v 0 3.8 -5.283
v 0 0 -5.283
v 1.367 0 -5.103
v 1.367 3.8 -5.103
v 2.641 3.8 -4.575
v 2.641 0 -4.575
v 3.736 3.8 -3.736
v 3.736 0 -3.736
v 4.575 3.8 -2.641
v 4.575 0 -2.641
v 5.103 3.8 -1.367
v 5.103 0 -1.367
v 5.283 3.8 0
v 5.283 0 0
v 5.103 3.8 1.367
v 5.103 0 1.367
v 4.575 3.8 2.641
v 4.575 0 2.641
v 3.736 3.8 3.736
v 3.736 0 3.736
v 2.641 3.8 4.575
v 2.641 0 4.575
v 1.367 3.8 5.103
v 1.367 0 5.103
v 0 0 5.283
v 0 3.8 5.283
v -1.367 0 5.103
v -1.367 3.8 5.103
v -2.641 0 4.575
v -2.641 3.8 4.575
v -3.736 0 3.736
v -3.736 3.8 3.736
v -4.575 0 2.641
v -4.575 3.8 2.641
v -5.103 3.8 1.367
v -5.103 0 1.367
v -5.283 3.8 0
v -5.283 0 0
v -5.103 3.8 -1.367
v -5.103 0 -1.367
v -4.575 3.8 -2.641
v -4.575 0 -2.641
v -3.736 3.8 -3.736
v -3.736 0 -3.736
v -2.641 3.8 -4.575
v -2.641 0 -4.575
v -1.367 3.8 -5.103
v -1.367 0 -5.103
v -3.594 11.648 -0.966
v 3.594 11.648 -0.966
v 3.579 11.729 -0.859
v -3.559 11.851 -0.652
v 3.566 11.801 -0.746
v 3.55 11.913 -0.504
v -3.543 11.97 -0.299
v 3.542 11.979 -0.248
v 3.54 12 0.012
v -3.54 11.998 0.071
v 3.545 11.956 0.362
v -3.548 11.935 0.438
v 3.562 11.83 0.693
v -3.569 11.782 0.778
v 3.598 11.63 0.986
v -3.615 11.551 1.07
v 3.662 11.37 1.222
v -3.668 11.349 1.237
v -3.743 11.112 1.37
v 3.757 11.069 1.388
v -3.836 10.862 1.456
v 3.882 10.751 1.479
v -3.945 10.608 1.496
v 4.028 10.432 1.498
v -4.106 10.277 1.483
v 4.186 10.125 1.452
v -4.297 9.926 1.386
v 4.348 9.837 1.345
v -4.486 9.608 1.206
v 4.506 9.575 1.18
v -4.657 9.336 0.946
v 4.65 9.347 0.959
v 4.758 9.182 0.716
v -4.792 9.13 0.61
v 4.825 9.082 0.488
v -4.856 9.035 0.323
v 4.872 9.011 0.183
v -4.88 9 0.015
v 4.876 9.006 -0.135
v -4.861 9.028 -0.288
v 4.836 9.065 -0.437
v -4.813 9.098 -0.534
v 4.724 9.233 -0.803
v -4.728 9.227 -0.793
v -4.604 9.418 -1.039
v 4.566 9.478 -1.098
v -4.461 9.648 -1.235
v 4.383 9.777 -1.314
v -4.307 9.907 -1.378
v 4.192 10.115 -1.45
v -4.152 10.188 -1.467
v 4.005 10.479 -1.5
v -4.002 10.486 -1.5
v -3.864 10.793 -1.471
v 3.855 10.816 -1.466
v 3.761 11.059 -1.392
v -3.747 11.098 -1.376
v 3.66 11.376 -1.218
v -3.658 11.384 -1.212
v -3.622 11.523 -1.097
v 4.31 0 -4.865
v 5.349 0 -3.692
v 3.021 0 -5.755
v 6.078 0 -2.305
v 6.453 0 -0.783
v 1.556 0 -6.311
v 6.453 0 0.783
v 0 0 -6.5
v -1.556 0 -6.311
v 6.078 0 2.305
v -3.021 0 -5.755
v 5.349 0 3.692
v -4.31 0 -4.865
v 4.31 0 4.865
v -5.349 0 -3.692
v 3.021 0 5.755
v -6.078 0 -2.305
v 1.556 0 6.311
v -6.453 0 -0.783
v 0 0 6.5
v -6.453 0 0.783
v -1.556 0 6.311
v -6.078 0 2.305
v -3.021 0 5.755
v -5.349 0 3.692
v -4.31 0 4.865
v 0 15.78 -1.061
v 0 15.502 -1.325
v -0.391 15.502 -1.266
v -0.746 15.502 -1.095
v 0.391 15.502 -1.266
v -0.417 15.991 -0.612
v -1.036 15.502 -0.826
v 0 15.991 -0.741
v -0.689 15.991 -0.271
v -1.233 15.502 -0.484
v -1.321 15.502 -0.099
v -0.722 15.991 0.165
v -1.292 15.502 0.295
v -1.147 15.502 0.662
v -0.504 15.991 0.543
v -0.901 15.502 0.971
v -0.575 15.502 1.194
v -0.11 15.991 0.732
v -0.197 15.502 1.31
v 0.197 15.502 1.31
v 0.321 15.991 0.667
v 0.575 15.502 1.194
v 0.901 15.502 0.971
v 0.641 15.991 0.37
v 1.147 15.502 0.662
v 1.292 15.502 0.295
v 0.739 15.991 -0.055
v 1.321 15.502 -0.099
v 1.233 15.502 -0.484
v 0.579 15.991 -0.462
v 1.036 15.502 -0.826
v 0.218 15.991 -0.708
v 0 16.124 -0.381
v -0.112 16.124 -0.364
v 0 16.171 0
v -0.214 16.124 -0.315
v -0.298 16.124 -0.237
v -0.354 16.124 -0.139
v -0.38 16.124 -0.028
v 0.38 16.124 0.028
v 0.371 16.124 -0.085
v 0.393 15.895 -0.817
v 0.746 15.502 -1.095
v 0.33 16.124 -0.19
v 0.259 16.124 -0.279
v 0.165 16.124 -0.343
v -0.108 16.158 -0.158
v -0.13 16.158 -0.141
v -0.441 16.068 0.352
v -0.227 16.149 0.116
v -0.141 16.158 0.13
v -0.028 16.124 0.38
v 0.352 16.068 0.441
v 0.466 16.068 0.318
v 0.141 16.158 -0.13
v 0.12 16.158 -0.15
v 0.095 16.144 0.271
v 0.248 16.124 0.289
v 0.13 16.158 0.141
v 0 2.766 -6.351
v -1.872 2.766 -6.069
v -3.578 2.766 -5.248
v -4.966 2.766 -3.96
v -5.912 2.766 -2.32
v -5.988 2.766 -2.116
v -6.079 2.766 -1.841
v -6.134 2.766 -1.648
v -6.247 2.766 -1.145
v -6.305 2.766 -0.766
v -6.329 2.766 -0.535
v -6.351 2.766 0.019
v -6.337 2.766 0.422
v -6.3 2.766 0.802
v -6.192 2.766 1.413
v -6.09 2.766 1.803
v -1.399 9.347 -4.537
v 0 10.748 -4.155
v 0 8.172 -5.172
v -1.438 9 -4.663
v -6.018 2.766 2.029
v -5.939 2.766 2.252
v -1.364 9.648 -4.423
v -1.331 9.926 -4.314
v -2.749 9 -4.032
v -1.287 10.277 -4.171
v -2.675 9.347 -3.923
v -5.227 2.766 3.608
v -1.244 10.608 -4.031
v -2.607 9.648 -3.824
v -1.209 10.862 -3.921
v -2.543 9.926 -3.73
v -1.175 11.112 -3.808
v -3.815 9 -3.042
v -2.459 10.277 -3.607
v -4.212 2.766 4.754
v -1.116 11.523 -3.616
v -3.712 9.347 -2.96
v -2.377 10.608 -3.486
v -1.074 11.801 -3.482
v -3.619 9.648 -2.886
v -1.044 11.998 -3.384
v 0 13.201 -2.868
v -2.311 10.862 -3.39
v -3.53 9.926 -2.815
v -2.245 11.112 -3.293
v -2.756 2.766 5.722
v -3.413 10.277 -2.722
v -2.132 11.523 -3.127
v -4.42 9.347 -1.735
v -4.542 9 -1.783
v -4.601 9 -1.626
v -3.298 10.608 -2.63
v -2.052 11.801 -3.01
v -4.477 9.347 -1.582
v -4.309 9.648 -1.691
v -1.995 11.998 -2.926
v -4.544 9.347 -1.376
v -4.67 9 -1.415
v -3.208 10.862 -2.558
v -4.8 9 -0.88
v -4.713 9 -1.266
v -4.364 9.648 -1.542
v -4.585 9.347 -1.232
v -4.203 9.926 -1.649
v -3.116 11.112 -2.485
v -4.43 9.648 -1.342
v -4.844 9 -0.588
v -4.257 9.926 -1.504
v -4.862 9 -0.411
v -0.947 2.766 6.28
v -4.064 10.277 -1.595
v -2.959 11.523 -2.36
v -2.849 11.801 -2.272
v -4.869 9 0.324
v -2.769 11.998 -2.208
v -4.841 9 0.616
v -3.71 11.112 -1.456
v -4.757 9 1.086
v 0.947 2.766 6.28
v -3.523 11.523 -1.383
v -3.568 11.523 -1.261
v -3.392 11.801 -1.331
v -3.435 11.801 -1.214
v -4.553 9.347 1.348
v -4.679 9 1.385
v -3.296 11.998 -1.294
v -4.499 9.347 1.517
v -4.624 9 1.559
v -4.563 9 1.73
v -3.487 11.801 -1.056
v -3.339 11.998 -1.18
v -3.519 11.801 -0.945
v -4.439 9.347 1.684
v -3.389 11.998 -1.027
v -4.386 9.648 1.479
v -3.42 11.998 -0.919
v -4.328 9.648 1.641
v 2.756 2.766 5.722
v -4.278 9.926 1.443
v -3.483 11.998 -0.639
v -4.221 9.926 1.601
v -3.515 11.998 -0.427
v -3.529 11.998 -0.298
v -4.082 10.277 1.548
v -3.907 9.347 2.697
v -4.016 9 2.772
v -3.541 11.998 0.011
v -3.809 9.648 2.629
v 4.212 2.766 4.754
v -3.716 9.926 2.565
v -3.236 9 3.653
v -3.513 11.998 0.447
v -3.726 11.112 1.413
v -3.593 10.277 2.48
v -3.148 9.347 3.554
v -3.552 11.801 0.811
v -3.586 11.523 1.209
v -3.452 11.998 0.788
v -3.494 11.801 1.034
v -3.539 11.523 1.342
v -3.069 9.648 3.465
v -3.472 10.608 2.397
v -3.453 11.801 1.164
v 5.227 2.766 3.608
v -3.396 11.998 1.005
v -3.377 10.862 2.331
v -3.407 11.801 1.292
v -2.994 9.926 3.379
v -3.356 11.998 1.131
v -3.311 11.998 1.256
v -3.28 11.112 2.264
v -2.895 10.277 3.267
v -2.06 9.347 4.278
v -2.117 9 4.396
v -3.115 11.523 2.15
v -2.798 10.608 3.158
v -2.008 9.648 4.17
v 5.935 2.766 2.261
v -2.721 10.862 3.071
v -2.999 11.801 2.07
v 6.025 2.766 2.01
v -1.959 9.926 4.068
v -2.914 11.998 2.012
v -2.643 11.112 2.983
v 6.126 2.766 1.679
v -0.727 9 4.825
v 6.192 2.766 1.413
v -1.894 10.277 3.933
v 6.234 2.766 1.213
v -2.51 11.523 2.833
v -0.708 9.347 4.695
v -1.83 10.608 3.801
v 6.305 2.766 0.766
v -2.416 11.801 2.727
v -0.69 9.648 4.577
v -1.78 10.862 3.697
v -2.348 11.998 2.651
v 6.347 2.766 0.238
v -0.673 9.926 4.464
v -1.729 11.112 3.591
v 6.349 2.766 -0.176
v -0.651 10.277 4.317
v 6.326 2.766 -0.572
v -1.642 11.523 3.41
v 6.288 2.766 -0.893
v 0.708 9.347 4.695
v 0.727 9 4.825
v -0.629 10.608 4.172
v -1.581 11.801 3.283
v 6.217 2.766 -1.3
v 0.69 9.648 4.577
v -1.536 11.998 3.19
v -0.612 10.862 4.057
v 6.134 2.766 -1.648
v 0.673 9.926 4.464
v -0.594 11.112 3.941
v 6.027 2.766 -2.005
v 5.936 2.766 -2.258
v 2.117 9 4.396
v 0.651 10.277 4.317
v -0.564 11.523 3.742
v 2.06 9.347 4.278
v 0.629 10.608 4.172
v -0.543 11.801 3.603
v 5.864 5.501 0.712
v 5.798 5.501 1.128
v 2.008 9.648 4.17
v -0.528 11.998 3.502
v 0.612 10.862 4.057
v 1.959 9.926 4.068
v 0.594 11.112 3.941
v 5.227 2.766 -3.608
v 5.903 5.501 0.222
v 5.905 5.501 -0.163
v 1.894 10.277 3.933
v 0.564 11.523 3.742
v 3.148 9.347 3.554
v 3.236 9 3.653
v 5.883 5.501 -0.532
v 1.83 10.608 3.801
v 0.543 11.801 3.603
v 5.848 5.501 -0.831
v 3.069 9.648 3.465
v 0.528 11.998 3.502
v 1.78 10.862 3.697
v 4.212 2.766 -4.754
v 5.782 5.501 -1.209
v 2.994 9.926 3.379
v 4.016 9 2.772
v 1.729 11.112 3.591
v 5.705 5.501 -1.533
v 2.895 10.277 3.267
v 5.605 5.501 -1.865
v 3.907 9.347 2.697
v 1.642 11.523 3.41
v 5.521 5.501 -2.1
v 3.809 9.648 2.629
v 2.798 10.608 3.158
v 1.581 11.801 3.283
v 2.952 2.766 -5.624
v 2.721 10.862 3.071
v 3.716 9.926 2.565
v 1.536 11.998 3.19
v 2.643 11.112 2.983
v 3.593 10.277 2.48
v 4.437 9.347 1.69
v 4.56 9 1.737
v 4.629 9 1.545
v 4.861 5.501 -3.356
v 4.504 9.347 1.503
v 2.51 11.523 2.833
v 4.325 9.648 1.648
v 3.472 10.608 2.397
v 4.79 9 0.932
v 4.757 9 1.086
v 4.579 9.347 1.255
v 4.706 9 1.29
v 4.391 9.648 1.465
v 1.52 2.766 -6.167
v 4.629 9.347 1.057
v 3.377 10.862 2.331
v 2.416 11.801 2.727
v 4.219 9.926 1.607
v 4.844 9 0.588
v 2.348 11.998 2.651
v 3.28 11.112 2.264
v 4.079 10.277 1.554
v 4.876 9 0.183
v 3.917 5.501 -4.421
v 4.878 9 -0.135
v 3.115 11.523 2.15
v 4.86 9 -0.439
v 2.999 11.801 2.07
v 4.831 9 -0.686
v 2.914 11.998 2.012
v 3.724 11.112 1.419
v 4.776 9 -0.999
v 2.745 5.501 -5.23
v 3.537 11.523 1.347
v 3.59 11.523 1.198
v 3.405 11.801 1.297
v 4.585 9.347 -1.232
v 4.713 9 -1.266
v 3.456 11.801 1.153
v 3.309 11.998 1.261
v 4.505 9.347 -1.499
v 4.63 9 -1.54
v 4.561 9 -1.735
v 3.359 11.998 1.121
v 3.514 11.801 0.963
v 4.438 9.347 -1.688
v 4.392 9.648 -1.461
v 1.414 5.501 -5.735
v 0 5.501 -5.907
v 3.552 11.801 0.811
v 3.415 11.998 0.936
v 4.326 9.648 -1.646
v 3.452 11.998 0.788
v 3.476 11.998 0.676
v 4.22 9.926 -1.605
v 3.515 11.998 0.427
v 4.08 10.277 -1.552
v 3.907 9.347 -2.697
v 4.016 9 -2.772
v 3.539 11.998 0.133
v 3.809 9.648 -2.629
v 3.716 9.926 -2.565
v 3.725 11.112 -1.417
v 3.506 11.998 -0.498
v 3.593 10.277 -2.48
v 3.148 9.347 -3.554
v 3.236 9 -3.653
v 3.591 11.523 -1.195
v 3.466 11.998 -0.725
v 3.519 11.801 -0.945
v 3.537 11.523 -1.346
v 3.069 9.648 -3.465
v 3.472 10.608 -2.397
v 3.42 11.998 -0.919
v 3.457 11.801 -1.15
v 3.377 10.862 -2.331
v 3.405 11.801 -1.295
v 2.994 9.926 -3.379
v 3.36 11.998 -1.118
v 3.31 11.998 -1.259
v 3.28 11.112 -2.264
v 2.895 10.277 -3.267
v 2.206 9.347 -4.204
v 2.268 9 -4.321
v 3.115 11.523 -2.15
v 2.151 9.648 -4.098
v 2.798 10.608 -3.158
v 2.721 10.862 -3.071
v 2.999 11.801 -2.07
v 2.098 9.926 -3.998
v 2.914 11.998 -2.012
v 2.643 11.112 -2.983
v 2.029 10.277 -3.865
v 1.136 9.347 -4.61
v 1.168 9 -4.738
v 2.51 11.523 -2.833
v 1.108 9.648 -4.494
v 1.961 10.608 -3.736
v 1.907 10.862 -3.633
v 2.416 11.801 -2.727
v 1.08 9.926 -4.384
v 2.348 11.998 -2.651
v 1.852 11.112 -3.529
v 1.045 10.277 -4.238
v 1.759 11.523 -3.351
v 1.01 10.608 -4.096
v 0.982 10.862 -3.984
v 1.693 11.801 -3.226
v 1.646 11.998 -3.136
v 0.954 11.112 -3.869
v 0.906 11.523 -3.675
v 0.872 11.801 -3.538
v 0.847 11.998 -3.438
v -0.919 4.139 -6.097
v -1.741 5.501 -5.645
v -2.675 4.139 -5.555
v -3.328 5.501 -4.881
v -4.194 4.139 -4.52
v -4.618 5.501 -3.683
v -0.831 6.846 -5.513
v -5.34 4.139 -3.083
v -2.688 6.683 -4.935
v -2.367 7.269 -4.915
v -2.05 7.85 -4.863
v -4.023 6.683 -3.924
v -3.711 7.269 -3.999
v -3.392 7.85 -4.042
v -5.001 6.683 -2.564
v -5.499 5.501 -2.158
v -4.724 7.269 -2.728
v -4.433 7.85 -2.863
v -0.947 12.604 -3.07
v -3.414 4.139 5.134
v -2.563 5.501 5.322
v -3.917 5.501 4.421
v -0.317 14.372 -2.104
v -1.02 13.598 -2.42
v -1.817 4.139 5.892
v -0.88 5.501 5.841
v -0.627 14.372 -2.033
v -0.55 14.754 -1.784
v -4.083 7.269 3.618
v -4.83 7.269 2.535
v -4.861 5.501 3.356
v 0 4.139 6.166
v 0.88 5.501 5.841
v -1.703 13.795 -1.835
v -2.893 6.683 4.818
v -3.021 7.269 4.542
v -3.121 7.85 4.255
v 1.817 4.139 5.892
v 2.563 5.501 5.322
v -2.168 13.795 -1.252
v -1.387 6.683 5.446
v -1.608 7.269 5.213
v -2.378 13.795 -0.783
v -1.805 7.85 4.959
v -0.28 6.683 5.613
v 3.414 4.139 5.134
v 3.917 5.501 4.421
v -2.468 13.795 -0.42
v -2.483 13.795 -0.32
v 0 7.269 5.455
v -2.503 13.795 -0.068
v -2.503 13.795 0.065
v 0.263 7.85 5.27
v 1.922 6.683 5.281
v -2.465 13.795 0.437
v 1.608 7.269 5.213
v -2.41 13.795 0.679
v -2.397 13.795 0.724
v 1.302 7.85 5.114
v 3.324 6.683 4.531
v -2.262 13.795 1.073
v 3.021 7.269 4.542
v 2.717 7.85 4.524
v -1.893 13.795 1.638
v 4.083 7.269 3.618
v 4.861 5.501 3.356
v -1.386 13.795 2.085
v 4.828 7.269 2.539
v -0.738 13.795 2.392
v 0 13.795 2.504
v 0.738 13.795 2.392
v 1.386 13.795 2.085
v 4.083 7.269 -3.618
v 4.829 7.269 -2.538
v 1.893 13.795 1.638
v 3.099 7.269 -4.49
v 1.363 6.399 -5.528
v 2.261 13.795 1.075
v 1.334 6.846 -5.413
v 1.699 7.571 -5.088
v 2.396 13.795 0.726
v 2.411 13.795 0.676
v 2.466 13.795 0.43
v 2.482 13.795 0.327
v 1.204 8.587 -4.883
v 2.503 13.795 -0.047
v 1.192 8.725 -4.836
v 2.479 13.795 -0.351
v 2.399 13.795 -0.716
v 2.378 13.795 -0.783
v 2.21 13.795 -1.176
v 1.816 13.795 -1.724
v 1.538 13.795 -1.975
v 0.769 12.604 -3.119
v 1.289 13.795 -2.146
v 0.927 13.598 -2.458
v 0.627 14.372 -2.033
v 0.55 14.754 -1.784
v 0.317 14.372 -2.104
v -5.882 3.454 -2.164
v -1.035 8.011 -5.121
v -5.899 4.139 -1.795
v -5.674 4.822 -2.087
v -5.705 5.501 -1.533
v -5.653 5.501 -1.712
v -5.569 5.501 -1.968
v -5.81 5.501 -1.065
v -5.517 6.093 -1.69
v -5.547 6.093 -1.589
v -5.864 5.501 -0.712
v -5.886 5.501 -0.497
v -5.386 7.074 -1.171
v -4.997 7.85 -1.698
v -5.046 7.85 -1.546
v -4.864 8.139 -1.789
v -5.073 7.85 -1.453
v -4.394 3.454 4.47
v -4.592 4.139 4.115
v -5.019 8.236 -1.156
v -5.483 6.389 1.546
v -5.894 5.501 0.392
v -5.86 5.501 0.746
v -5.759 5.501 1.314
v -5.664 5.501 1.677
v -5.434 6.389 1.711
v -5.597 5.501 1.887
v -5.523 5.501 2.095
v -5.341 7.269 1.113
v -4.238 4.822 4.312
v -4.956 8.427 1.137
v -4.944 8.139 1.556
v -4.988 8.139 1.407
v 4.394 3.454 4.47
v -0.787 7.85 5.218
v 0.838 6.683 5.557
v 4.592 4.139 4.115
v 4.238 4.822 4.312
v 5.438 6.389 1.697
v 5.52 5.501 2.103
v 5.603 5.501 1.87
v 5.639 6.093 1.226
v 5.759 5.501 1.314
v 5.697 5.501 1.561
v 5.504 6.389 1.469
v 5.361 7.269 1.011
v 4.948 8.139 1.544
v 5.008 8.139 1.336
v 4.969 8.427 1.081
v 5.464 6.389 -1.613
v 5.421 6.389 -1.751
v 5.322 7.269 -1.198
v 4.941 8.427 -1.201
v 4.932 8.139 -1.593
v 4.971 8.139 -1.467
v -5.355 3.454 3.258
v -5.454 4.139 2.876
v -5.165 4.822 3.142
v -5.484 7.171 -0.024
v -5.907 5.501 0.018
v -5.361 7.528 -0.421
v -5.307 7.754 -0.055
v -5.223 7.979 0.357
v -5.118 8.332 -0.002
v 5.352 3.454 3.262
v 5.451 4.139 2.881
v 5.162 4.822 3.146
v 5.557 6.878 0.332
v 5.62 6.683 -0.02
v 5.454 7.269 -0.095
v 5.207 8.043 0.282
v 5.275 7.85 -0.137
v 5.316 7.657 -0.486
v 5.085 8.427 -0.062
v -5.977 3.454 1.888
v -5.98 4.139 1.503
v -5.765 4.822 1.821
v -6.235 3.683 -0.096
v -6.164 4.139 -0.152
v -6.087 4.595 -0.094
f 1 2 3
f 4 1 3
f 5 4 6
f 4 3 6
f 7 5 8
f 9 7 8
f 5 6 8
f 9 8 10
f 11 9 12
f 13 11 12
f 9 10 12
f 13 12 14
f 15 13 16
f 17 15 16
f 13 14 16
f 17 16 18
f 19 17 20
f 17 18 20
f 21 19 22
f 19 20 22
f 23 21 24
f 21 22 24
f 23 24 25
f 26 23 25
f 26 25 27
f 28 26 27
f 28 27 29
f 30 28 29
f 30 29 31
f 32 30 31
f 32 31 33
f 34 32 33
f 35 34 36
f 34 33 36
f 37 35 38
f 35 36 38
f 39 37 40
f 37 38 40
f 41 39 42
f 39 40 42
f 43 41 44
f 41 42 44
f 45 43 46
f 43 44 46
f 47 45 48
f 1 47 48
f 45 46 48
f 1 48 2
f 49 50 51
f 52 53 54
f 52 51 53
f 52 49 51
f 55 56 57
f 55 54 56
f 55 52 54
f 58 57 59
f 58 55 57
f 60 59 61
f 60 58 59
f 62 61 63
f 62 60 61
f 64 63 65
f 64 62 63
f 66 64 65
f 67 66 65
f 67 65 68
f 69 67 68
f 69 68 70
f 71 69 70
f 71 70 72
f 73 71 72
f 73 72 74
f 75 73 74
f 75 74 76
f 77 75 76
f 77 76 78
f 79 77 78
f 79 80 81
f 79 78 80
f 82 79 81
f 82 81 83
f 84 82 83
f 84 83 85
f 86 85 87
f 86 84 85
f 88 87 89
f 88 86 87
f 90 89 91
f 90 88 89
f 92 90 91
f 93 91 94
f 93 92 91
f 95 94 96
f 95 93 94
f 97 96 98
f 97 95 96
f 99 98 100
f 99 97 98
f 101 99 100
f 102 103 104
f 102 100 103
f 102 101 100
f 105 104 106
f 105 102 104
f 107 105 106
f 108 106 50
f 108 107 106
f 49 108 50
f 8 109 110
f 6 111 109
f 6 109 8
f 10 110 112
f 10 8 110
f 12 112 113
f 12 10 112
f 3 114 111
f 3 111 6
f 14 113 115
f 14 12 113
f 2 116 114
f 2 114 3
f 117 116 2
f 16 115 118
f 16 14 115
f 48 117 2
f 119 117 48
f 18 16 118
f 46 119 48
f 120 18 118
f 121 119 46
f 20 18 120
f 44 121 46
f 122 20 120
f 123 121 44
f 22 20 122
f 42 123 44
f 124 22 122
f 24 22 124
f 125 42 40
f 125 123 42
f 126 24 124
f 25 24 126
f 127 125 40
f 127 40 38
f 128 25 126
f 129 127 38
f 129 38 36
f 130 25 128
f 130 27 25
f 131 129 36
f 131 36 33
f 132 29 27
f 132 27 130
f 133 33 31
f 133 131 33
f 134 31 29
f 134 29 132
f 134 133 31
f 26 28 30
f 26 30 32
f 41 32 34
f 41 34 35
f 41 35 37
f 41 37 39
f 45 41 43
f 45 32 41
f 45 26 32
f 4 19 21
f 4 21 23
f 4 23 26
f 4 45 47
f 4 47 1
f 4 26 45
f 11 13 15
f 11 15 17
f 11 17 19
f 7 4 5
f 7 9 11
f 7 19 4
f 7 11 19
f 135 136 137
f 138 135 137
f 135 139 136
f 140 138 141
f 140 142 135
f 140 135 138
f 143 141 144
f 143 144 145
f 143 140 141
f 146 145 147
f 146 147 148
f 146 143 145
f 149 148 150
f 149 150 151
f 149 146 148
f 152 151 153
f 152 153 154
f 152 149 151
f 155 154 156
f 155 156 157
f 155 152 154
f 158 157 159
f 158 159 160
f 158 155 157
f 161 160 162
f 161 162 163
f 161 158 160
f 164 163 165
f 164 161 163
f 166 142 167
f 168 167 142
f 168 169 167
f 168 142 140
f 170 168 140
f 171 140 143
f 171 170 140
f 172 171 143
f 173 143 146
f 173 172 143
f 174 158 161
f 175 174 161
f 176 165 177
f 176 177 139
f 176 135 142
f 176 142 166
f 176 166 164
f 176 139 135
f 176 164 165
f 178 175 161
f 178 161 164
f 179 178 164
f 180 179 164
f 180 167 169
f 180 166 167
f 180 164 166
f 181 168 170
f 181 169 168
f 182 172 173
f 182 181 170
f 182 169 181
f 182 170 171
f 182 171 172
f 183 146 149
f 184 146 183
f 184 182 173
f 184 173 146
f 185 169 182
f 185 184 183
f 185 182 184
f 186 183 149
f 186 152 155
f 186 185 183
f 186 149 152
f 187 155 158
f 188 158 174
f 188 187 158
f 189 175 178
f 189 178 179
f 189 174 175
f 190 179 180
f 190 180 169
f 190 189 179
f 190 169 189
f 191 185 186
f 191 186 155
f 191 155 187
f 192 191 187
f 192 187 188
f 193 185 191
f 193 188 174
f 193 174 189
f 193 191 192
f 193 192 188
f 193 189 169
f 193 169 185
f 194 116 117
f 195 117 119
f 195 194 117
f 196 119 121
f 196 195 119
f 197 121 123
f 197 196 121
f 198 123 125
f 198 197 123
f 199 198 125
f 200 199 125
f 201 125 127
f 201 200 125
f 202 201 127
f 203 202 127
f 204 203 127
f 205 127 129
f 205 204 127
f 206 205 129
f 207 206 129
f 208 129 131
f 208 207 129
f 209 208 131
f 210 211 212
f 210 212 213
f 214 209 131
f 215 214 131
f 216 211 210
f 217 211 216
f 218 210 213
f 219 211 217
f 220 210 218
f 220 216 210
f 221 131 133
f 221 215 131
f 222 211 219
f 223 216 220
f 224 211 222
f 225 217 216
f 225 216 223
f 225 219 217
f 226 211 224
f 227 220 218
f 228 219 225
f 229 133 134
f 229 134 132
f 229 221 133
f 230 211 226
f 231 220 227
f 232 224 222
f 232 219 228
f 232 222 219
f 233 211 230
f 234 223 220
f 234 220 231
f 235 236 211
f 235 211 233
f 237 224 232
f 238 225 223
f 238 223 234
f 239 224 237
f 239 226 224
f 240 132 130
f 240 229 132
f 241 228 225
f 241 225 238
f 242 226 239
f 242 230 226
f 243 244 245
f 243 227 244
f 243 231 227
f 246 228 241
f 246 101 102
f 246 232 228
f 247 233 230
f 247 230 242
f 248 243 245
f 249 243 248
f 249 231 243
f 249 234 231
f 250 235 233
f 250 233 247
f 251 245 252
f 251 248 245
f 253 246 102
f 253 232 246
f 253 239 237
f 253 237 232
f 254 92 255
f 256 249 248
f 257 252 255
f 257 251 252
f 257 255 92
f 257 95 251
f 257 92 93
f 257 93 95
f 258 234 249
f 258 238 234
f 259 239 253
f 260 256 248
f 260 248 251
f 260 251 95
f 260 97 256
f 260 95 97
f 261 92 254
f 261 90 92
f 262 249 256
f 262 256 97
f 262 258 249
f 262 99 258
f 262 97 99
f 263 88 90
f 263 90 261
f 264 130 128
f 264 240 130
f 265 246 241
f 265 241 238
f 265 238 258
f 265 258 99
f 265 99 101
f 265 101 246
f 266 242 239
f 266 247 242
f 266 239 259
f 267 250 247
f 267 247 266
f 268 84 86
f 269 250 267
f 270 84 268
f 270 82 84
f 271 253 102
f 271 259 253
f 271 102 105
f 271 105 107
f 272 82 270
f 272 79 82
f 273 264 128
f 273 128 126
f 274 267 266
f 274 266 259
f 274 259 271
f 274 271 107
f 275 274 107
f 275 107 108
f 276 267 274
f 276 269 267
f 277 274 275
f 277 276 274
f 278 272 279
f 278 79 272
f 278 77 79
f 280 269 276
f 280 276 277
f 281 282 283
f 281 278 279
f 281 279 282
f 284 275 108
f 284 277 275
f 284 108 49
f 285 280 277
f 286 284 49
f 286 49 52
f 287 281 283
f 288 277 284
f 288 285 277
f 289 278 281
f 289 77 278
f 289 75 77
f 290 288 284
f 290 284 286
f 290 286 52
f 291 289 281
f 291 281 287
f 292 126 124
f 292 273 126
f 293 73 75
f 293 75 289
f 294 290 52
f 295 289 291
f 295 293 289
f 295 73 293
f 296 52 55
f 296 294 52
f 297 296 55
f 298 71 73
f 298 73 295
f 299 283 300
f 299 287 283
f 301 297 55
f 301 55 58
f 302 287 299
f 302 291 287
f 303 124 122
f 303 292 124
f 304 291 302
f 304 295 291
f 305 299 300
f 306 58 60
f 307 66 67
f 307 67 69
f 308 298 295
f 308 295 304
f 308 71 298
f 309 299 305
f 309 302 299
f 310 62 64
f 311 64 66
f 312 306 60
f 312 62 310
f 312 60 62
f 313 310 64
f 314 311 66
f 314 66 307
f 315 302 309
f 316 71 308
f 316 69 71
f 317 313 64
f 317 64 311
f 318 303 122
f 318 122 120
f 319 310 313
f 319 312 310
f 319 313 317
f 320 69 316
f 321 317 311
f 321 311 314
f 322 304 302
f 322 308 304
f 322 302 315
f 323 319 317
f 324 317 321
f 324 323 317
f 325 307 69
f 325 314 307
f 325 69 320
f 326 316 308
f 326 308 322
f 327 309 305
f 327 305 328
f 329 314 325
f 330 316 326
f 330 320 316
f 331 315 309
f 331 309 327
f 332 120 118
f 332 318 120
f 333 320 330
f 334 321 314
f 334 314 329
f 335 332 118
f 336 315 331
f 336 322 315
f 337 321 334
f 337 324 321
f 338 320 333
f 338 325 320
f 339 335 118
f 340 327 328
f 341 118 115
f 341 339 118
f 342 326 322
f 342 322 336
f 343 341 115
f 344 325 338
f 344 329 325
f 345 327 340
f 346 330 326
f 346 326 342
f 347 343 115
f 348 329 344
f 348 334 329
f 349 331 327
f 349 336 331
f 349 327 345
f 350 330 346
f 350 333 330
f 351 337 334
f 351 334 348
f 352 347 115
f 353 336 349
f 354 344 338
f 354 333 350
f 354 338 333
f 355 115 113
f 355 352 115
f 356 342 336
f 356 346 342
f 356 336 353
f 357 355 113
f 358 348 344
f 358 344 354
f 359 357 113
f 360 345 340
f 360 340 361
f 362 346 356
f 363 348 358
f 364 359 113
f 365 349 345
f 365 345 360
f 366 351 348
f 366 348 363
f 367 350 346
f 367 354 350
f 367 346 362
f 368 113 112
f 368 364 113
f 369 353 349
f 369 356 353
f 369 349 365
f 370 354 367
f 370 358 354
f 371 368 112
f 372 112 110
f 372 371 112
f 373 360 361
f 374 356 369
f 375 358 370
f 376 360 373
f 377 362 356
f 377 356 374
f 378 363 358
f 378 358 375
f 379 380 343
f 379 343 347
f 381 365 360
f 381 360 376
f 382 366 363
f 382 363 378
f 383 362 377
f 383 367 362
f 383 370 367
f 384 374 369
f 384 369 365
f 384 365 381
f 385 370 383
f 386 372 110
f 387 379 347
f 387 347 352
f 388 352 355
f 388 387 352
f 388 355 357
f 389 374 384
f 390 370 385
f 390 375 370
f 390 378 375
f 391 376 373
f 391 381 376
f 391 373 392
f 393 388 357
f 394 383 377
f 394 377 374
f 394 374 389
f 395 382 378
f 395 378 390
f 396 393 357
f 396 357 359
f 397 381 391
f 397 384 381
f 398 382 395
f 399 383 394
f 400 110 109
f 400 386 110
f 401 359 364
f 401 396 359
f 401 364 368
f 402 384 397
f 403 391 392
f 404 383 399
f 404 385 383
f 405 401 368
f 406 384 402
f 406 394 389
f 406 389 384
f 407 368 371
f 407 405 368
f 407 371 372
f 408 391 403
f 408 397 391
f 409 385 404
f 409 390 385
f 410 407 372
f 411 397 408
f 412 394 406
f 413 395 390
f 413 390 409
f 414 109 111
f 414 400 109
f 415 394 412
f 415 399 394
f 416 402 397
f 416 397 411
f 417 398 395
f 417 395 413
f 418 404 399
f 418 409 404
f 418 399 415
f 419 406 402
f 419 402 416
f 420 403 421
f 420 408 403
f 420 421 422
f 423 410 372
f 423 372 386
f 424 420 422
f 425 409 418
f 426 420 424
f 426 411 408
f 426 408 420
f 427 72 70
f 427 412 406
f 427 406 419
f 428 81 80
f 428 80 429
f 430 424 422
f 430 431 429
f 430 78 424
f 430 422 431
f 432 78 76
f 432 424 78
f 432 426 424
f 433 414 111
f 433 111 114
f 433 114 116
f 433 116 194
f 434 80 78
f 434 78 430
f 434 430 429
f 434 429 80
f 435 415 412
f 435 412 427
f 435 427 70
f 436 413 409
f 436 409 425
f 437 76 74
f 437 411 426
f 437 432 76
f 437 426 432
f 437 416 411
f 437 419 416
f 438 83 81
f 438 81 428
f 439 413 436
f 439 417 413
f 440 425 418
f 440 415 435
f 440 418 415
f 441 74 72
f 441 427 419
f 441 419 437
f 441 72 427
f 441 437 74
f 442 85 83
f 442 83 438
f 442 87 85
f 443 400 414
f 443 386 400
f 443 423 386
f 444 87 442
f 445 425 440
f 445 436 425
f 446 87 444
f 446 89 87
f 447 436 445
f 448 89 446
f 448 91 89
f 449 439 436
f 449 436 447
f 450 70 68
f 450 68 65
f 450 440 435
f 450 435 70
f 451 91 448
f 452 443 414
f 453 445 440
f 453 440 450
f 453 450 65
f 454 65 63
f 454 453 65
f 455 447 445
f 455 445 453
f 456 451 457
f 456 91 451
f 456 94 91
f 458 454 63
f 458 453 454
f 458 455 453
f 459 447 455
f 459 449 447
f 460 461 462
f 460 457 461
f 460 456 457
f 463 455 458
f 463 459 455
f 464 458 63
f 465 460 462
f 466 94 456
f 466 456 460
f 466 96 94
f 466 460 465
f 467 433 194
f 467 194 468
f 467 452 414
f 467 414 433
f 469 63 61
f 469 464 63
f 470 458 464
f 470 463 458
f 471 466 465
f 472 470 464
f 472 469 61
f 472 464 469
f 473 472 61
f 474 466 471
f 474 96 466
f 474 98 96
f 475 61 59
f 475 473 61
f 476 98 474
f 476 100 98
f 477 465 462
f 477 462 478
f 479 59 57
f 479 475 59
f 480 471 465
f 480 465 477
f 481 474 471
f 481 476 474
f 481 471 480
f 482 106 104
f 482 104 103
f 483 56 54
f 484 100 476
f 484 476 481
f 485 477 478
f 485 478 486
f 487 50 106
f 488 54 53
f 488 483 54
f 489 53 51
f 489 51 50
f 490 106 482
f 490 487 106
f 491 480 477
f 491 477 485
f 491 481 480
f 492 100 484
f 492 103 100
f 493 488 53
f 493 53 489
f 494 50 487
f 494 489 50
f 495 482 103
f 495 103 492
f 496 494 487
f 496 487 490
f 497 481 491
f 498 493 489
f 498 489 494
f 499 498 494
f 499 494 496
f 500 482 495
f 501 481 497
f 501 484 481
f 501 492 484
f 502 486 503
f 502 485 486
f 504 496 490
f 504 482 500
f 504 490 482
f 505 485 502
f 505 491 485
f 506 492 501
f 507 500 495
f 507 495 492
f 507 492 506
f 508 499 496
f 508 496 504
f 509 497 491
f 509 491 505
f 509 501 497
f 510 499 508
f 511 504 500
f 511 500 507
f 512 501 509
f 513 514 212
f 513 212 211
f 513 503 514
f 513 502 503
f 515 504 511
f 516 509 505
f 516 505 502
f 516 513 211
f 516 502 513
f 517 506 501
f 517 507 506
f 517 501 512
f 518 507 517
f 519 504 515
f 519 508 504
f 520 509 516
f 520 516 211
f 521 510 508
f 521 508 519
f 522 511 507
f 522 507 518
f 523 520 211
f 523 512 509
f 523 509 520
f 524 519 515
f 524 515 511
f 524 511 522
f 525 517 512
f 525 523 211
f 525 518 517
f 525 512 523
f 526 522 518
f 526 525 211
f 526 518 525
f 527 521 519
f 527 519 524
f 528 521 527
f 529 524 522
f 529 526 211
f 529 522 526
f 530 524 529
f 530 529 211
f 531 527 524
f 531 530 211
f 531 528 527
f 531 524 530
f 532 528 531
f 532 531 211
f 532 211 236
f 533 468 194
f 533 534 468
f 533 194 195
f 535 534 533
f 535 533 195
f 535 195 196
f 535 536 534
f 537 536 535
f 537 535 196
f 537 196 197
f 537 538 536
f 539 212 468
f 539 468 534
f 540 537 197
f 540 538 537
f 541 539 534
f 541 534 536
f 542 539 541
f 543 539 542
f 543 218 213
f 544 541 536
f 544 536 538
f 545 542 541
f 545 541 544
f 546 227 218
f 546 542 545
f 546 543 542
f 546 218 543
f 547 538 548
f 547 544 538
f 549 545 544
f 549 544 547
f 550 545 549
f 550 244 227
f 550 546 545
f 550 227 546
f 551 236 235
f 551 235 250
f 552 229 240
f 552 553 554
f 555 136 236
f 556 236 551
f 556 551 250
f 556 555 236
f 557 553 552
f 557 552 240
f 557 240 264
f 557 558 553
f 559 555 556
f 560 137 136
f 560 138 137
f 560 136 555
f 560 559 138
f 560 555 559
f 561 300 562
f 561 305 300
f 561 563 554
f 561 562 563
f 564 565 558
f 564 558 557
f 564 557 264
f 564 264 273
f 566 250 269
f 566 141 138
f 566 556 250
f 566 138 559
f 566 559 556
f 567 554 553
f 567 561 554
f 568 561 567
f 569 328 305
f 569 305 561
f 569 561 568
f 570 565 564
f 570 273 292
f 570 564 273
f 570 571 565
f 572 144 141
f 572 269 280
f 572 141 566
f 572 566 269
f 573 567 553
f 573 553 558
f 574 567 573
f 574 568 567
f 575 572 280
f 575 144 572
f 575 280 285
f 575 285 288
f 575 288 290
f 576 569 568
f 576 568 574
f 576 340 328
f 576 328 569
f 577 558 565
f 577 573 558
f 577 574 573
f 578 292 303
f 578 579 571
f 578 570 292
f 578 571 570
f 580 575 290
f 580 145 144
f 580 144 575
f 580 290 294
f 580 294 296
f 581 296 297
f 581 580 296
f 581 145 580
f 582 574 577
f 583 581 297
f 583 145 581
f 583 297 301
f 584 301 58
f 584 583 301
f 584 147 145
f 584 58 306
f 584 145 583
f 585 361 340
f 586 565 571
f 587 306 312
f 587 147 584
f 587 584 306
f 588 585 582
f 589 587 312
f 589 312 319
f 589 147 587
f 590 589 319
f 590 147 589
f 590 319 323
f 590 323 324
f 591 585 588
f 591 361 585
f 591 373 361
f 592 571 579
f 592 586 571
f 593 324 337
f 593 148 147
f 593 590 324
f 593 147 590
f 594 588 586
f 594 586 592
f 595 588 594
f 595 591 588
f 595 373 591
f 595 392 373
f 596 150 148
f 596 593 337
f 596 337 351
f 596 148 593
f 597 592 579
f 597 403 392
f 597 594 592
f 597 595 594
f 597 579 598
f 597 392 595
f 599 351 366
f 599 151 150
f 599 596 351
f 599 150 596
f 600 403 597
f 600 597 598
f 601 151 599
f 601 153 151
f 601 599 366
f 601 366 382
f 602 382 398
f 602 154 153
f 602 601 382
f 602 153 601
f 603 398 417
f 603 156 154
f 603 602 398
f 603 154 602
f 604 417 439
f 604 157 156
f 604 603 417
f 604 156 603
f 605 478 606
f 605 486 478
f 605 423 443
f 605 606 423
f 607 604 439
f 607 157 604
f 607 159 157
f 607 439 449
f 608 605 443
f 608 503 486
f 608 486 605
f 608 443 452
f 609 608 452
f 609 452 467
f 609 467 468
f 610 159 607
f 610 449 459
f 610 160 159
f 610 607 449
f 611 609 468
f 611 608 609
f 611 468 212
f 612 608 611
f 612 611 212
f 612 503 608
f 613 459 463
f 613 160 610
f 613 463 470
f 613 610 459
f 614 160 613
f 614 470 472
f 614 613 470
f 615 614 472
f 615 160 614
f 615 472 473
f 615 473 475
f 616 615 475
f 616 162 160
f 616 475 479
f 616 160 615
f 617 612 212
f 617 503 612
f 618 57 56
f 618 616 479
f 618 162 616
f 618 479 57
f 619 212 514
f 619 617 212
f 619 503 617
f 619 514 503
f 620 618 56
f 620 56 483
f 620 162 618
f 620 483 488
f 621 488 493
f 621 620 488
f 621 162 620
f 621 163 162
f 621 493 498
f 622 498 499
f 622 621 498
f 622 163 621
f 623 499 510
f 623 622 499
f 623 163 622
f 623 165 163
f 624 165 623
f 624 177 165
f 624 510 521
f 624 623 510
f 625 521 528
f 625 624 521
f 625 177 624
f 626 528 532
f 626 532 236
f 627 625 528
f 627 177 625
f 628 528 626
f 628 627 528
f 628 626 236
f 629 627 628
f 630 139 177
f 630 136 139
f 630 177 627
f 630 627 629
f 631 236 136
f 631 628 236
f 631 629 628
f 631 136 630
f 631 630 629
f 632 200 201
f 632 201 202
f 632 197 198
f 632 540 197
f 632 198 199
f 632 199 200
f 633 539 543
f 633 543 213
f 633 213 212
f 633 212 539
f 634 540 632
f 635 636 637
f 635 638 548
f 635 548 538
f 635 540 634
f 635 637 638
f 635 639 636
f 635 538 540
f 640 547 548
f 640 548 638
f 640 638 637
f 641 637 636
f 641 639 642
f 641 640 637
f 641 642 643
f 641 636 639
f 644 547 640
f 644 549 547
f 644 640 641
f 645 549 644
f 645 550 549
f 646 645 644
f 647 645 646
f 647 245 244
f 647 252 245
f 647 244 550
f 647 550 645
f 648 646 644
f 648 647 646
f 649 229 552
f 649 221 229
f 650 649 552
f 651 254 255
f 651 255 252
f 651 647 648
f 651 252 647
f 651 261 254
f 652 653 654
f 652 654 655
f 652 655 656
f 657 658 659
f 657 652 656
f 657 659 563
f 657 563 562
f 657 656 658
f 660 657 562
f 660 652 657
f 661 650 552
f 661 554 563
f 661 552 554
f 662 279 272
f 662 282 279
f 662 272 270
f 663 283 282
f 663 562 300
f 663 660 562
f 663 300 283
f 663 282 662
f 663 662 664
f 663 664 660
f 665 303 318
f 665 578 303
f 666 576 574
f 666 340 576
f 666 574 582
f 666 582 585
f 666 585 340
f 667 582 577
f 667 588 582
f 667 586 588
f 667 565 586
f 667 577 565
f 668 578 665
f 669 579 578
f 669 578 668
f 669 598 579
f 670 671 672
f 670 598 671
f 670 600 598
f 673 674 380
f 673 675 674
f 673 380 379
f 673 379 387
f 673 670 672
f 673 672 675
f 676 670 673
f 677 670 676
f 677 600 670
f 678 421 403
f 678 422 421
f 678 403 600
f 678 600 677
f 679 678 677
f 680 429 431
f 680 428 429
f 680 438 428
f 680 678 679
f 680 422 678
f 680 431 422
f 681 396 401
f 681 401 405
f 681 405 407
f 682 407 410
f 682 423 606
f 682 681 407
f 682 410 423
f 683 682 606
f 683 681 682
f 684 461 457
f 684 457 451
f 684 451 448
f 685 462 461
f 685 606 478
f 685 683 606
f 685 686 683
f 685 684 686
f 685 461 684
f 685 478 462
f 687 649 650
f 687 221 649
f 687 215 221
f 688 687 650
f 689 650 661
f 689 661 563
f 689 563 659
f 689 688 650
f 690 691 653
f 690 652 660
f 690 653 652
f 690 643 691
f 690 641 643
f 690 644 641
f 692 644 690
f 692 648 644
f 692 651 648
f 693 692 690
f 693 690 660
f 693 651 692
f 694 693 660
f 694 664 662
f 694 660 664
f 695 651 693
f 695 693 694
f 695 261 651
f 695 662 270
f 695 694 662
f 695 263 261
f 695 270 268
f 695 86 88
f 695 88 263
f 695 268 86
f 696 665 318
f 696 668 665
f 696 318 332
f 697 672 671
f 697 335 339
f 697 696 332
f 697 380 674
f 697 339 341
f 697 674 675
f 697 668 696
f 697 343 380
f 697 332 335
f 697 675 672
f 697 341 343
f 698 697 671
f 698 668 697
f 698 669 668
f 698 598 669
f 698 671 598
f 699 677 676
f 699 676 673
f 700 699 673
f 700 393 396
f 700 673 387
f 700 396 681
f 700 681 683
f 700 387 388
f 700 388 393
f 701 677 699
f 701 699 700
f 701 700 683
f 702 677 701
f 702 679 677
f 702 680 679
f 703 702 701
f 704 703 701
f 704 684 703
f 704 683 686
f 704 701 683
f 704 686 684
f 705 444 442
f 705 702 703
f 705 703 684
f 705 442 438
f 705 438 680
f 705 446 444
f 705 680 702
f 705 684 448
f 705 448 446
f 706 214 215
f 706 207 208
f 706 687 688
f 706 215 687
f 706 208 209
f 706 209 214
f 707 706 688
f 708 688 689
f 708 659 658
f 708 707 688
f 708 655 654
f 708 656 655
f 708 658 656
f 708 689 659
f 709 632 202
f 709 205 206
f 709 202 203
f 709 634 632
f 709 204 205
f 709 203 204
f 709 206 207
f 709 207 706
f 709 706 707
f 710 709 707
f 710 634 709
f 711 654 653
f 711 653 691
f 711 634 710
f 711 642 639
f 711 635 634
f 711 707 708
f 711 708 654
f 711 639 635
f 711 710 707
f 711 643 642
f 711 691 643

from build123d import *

# Parameters (mm, degrees)
SKETCH2_R               = 5.282935157
CUT_EXTRUDE1_DEPTH      = 3.8
CUT_EXTRUDE2_DEPTH      = 19.600984372
CUT_EXTRUDE2_DEPTH_BACK = 19.600984372
SKETCH3_R               = 1.5


with BuildPart() as part:
    # Sketch1 → Revolve1 (revolve)
    with BuildSketch(Plane(origin=(0, 0, 0), x_dir=(0, 0, -1), z_dir=(1, 0, 0))):
        with BuildLine():
            Line((0, 0), (6.5, 0))
            ThreePointArc((6.5, 0), (5.172084989, 8.171560643), (1.324999798, 15.502160698))
            ThreePointArc((1.324999798, 15.502160698), (0.740614183, 15.991289723), (0, 16.170856928))
            Line((0, 16.170856928), (0, 0))
        make_face()
    revolve(axis=Axis((0, 0, 0), (0, 1, 0)))

    # Sketch2 → Cut-Extrude1 (cut)
    with BuildSketch(Plane.XZ):
        with Locations(Location((0, 0, 0), (0, 0, 270))):
            Circle(SKETCH2_R)
    extrude(amount=-CUT_EXTRUDE1_DEPTH, mode=Mode.SUBTRACT)

    # Sketch3 → Cut-Extrude2 (cut, two sides: drawn at the far end of the back side and taken through both)
    with BuildSketch(Plane(origin=(0, 0, 0), x_dir=(0, 0, -1), z_dir=(1, 0, 0)).offset(-CUT_EXTRUDE2_DEPTH_BACK)):
        with Locations(Location((0, 10.5, 0), (0, 0, 49.923498867))):
            Circle(SKETCH3_R)
    extrude(amount=CUT_EXTRUDE2_DEPTH + CUT_EXTRUDE2_DEPTH_BACK, mode=Mode.SUBTRACT)


solid = part.part
